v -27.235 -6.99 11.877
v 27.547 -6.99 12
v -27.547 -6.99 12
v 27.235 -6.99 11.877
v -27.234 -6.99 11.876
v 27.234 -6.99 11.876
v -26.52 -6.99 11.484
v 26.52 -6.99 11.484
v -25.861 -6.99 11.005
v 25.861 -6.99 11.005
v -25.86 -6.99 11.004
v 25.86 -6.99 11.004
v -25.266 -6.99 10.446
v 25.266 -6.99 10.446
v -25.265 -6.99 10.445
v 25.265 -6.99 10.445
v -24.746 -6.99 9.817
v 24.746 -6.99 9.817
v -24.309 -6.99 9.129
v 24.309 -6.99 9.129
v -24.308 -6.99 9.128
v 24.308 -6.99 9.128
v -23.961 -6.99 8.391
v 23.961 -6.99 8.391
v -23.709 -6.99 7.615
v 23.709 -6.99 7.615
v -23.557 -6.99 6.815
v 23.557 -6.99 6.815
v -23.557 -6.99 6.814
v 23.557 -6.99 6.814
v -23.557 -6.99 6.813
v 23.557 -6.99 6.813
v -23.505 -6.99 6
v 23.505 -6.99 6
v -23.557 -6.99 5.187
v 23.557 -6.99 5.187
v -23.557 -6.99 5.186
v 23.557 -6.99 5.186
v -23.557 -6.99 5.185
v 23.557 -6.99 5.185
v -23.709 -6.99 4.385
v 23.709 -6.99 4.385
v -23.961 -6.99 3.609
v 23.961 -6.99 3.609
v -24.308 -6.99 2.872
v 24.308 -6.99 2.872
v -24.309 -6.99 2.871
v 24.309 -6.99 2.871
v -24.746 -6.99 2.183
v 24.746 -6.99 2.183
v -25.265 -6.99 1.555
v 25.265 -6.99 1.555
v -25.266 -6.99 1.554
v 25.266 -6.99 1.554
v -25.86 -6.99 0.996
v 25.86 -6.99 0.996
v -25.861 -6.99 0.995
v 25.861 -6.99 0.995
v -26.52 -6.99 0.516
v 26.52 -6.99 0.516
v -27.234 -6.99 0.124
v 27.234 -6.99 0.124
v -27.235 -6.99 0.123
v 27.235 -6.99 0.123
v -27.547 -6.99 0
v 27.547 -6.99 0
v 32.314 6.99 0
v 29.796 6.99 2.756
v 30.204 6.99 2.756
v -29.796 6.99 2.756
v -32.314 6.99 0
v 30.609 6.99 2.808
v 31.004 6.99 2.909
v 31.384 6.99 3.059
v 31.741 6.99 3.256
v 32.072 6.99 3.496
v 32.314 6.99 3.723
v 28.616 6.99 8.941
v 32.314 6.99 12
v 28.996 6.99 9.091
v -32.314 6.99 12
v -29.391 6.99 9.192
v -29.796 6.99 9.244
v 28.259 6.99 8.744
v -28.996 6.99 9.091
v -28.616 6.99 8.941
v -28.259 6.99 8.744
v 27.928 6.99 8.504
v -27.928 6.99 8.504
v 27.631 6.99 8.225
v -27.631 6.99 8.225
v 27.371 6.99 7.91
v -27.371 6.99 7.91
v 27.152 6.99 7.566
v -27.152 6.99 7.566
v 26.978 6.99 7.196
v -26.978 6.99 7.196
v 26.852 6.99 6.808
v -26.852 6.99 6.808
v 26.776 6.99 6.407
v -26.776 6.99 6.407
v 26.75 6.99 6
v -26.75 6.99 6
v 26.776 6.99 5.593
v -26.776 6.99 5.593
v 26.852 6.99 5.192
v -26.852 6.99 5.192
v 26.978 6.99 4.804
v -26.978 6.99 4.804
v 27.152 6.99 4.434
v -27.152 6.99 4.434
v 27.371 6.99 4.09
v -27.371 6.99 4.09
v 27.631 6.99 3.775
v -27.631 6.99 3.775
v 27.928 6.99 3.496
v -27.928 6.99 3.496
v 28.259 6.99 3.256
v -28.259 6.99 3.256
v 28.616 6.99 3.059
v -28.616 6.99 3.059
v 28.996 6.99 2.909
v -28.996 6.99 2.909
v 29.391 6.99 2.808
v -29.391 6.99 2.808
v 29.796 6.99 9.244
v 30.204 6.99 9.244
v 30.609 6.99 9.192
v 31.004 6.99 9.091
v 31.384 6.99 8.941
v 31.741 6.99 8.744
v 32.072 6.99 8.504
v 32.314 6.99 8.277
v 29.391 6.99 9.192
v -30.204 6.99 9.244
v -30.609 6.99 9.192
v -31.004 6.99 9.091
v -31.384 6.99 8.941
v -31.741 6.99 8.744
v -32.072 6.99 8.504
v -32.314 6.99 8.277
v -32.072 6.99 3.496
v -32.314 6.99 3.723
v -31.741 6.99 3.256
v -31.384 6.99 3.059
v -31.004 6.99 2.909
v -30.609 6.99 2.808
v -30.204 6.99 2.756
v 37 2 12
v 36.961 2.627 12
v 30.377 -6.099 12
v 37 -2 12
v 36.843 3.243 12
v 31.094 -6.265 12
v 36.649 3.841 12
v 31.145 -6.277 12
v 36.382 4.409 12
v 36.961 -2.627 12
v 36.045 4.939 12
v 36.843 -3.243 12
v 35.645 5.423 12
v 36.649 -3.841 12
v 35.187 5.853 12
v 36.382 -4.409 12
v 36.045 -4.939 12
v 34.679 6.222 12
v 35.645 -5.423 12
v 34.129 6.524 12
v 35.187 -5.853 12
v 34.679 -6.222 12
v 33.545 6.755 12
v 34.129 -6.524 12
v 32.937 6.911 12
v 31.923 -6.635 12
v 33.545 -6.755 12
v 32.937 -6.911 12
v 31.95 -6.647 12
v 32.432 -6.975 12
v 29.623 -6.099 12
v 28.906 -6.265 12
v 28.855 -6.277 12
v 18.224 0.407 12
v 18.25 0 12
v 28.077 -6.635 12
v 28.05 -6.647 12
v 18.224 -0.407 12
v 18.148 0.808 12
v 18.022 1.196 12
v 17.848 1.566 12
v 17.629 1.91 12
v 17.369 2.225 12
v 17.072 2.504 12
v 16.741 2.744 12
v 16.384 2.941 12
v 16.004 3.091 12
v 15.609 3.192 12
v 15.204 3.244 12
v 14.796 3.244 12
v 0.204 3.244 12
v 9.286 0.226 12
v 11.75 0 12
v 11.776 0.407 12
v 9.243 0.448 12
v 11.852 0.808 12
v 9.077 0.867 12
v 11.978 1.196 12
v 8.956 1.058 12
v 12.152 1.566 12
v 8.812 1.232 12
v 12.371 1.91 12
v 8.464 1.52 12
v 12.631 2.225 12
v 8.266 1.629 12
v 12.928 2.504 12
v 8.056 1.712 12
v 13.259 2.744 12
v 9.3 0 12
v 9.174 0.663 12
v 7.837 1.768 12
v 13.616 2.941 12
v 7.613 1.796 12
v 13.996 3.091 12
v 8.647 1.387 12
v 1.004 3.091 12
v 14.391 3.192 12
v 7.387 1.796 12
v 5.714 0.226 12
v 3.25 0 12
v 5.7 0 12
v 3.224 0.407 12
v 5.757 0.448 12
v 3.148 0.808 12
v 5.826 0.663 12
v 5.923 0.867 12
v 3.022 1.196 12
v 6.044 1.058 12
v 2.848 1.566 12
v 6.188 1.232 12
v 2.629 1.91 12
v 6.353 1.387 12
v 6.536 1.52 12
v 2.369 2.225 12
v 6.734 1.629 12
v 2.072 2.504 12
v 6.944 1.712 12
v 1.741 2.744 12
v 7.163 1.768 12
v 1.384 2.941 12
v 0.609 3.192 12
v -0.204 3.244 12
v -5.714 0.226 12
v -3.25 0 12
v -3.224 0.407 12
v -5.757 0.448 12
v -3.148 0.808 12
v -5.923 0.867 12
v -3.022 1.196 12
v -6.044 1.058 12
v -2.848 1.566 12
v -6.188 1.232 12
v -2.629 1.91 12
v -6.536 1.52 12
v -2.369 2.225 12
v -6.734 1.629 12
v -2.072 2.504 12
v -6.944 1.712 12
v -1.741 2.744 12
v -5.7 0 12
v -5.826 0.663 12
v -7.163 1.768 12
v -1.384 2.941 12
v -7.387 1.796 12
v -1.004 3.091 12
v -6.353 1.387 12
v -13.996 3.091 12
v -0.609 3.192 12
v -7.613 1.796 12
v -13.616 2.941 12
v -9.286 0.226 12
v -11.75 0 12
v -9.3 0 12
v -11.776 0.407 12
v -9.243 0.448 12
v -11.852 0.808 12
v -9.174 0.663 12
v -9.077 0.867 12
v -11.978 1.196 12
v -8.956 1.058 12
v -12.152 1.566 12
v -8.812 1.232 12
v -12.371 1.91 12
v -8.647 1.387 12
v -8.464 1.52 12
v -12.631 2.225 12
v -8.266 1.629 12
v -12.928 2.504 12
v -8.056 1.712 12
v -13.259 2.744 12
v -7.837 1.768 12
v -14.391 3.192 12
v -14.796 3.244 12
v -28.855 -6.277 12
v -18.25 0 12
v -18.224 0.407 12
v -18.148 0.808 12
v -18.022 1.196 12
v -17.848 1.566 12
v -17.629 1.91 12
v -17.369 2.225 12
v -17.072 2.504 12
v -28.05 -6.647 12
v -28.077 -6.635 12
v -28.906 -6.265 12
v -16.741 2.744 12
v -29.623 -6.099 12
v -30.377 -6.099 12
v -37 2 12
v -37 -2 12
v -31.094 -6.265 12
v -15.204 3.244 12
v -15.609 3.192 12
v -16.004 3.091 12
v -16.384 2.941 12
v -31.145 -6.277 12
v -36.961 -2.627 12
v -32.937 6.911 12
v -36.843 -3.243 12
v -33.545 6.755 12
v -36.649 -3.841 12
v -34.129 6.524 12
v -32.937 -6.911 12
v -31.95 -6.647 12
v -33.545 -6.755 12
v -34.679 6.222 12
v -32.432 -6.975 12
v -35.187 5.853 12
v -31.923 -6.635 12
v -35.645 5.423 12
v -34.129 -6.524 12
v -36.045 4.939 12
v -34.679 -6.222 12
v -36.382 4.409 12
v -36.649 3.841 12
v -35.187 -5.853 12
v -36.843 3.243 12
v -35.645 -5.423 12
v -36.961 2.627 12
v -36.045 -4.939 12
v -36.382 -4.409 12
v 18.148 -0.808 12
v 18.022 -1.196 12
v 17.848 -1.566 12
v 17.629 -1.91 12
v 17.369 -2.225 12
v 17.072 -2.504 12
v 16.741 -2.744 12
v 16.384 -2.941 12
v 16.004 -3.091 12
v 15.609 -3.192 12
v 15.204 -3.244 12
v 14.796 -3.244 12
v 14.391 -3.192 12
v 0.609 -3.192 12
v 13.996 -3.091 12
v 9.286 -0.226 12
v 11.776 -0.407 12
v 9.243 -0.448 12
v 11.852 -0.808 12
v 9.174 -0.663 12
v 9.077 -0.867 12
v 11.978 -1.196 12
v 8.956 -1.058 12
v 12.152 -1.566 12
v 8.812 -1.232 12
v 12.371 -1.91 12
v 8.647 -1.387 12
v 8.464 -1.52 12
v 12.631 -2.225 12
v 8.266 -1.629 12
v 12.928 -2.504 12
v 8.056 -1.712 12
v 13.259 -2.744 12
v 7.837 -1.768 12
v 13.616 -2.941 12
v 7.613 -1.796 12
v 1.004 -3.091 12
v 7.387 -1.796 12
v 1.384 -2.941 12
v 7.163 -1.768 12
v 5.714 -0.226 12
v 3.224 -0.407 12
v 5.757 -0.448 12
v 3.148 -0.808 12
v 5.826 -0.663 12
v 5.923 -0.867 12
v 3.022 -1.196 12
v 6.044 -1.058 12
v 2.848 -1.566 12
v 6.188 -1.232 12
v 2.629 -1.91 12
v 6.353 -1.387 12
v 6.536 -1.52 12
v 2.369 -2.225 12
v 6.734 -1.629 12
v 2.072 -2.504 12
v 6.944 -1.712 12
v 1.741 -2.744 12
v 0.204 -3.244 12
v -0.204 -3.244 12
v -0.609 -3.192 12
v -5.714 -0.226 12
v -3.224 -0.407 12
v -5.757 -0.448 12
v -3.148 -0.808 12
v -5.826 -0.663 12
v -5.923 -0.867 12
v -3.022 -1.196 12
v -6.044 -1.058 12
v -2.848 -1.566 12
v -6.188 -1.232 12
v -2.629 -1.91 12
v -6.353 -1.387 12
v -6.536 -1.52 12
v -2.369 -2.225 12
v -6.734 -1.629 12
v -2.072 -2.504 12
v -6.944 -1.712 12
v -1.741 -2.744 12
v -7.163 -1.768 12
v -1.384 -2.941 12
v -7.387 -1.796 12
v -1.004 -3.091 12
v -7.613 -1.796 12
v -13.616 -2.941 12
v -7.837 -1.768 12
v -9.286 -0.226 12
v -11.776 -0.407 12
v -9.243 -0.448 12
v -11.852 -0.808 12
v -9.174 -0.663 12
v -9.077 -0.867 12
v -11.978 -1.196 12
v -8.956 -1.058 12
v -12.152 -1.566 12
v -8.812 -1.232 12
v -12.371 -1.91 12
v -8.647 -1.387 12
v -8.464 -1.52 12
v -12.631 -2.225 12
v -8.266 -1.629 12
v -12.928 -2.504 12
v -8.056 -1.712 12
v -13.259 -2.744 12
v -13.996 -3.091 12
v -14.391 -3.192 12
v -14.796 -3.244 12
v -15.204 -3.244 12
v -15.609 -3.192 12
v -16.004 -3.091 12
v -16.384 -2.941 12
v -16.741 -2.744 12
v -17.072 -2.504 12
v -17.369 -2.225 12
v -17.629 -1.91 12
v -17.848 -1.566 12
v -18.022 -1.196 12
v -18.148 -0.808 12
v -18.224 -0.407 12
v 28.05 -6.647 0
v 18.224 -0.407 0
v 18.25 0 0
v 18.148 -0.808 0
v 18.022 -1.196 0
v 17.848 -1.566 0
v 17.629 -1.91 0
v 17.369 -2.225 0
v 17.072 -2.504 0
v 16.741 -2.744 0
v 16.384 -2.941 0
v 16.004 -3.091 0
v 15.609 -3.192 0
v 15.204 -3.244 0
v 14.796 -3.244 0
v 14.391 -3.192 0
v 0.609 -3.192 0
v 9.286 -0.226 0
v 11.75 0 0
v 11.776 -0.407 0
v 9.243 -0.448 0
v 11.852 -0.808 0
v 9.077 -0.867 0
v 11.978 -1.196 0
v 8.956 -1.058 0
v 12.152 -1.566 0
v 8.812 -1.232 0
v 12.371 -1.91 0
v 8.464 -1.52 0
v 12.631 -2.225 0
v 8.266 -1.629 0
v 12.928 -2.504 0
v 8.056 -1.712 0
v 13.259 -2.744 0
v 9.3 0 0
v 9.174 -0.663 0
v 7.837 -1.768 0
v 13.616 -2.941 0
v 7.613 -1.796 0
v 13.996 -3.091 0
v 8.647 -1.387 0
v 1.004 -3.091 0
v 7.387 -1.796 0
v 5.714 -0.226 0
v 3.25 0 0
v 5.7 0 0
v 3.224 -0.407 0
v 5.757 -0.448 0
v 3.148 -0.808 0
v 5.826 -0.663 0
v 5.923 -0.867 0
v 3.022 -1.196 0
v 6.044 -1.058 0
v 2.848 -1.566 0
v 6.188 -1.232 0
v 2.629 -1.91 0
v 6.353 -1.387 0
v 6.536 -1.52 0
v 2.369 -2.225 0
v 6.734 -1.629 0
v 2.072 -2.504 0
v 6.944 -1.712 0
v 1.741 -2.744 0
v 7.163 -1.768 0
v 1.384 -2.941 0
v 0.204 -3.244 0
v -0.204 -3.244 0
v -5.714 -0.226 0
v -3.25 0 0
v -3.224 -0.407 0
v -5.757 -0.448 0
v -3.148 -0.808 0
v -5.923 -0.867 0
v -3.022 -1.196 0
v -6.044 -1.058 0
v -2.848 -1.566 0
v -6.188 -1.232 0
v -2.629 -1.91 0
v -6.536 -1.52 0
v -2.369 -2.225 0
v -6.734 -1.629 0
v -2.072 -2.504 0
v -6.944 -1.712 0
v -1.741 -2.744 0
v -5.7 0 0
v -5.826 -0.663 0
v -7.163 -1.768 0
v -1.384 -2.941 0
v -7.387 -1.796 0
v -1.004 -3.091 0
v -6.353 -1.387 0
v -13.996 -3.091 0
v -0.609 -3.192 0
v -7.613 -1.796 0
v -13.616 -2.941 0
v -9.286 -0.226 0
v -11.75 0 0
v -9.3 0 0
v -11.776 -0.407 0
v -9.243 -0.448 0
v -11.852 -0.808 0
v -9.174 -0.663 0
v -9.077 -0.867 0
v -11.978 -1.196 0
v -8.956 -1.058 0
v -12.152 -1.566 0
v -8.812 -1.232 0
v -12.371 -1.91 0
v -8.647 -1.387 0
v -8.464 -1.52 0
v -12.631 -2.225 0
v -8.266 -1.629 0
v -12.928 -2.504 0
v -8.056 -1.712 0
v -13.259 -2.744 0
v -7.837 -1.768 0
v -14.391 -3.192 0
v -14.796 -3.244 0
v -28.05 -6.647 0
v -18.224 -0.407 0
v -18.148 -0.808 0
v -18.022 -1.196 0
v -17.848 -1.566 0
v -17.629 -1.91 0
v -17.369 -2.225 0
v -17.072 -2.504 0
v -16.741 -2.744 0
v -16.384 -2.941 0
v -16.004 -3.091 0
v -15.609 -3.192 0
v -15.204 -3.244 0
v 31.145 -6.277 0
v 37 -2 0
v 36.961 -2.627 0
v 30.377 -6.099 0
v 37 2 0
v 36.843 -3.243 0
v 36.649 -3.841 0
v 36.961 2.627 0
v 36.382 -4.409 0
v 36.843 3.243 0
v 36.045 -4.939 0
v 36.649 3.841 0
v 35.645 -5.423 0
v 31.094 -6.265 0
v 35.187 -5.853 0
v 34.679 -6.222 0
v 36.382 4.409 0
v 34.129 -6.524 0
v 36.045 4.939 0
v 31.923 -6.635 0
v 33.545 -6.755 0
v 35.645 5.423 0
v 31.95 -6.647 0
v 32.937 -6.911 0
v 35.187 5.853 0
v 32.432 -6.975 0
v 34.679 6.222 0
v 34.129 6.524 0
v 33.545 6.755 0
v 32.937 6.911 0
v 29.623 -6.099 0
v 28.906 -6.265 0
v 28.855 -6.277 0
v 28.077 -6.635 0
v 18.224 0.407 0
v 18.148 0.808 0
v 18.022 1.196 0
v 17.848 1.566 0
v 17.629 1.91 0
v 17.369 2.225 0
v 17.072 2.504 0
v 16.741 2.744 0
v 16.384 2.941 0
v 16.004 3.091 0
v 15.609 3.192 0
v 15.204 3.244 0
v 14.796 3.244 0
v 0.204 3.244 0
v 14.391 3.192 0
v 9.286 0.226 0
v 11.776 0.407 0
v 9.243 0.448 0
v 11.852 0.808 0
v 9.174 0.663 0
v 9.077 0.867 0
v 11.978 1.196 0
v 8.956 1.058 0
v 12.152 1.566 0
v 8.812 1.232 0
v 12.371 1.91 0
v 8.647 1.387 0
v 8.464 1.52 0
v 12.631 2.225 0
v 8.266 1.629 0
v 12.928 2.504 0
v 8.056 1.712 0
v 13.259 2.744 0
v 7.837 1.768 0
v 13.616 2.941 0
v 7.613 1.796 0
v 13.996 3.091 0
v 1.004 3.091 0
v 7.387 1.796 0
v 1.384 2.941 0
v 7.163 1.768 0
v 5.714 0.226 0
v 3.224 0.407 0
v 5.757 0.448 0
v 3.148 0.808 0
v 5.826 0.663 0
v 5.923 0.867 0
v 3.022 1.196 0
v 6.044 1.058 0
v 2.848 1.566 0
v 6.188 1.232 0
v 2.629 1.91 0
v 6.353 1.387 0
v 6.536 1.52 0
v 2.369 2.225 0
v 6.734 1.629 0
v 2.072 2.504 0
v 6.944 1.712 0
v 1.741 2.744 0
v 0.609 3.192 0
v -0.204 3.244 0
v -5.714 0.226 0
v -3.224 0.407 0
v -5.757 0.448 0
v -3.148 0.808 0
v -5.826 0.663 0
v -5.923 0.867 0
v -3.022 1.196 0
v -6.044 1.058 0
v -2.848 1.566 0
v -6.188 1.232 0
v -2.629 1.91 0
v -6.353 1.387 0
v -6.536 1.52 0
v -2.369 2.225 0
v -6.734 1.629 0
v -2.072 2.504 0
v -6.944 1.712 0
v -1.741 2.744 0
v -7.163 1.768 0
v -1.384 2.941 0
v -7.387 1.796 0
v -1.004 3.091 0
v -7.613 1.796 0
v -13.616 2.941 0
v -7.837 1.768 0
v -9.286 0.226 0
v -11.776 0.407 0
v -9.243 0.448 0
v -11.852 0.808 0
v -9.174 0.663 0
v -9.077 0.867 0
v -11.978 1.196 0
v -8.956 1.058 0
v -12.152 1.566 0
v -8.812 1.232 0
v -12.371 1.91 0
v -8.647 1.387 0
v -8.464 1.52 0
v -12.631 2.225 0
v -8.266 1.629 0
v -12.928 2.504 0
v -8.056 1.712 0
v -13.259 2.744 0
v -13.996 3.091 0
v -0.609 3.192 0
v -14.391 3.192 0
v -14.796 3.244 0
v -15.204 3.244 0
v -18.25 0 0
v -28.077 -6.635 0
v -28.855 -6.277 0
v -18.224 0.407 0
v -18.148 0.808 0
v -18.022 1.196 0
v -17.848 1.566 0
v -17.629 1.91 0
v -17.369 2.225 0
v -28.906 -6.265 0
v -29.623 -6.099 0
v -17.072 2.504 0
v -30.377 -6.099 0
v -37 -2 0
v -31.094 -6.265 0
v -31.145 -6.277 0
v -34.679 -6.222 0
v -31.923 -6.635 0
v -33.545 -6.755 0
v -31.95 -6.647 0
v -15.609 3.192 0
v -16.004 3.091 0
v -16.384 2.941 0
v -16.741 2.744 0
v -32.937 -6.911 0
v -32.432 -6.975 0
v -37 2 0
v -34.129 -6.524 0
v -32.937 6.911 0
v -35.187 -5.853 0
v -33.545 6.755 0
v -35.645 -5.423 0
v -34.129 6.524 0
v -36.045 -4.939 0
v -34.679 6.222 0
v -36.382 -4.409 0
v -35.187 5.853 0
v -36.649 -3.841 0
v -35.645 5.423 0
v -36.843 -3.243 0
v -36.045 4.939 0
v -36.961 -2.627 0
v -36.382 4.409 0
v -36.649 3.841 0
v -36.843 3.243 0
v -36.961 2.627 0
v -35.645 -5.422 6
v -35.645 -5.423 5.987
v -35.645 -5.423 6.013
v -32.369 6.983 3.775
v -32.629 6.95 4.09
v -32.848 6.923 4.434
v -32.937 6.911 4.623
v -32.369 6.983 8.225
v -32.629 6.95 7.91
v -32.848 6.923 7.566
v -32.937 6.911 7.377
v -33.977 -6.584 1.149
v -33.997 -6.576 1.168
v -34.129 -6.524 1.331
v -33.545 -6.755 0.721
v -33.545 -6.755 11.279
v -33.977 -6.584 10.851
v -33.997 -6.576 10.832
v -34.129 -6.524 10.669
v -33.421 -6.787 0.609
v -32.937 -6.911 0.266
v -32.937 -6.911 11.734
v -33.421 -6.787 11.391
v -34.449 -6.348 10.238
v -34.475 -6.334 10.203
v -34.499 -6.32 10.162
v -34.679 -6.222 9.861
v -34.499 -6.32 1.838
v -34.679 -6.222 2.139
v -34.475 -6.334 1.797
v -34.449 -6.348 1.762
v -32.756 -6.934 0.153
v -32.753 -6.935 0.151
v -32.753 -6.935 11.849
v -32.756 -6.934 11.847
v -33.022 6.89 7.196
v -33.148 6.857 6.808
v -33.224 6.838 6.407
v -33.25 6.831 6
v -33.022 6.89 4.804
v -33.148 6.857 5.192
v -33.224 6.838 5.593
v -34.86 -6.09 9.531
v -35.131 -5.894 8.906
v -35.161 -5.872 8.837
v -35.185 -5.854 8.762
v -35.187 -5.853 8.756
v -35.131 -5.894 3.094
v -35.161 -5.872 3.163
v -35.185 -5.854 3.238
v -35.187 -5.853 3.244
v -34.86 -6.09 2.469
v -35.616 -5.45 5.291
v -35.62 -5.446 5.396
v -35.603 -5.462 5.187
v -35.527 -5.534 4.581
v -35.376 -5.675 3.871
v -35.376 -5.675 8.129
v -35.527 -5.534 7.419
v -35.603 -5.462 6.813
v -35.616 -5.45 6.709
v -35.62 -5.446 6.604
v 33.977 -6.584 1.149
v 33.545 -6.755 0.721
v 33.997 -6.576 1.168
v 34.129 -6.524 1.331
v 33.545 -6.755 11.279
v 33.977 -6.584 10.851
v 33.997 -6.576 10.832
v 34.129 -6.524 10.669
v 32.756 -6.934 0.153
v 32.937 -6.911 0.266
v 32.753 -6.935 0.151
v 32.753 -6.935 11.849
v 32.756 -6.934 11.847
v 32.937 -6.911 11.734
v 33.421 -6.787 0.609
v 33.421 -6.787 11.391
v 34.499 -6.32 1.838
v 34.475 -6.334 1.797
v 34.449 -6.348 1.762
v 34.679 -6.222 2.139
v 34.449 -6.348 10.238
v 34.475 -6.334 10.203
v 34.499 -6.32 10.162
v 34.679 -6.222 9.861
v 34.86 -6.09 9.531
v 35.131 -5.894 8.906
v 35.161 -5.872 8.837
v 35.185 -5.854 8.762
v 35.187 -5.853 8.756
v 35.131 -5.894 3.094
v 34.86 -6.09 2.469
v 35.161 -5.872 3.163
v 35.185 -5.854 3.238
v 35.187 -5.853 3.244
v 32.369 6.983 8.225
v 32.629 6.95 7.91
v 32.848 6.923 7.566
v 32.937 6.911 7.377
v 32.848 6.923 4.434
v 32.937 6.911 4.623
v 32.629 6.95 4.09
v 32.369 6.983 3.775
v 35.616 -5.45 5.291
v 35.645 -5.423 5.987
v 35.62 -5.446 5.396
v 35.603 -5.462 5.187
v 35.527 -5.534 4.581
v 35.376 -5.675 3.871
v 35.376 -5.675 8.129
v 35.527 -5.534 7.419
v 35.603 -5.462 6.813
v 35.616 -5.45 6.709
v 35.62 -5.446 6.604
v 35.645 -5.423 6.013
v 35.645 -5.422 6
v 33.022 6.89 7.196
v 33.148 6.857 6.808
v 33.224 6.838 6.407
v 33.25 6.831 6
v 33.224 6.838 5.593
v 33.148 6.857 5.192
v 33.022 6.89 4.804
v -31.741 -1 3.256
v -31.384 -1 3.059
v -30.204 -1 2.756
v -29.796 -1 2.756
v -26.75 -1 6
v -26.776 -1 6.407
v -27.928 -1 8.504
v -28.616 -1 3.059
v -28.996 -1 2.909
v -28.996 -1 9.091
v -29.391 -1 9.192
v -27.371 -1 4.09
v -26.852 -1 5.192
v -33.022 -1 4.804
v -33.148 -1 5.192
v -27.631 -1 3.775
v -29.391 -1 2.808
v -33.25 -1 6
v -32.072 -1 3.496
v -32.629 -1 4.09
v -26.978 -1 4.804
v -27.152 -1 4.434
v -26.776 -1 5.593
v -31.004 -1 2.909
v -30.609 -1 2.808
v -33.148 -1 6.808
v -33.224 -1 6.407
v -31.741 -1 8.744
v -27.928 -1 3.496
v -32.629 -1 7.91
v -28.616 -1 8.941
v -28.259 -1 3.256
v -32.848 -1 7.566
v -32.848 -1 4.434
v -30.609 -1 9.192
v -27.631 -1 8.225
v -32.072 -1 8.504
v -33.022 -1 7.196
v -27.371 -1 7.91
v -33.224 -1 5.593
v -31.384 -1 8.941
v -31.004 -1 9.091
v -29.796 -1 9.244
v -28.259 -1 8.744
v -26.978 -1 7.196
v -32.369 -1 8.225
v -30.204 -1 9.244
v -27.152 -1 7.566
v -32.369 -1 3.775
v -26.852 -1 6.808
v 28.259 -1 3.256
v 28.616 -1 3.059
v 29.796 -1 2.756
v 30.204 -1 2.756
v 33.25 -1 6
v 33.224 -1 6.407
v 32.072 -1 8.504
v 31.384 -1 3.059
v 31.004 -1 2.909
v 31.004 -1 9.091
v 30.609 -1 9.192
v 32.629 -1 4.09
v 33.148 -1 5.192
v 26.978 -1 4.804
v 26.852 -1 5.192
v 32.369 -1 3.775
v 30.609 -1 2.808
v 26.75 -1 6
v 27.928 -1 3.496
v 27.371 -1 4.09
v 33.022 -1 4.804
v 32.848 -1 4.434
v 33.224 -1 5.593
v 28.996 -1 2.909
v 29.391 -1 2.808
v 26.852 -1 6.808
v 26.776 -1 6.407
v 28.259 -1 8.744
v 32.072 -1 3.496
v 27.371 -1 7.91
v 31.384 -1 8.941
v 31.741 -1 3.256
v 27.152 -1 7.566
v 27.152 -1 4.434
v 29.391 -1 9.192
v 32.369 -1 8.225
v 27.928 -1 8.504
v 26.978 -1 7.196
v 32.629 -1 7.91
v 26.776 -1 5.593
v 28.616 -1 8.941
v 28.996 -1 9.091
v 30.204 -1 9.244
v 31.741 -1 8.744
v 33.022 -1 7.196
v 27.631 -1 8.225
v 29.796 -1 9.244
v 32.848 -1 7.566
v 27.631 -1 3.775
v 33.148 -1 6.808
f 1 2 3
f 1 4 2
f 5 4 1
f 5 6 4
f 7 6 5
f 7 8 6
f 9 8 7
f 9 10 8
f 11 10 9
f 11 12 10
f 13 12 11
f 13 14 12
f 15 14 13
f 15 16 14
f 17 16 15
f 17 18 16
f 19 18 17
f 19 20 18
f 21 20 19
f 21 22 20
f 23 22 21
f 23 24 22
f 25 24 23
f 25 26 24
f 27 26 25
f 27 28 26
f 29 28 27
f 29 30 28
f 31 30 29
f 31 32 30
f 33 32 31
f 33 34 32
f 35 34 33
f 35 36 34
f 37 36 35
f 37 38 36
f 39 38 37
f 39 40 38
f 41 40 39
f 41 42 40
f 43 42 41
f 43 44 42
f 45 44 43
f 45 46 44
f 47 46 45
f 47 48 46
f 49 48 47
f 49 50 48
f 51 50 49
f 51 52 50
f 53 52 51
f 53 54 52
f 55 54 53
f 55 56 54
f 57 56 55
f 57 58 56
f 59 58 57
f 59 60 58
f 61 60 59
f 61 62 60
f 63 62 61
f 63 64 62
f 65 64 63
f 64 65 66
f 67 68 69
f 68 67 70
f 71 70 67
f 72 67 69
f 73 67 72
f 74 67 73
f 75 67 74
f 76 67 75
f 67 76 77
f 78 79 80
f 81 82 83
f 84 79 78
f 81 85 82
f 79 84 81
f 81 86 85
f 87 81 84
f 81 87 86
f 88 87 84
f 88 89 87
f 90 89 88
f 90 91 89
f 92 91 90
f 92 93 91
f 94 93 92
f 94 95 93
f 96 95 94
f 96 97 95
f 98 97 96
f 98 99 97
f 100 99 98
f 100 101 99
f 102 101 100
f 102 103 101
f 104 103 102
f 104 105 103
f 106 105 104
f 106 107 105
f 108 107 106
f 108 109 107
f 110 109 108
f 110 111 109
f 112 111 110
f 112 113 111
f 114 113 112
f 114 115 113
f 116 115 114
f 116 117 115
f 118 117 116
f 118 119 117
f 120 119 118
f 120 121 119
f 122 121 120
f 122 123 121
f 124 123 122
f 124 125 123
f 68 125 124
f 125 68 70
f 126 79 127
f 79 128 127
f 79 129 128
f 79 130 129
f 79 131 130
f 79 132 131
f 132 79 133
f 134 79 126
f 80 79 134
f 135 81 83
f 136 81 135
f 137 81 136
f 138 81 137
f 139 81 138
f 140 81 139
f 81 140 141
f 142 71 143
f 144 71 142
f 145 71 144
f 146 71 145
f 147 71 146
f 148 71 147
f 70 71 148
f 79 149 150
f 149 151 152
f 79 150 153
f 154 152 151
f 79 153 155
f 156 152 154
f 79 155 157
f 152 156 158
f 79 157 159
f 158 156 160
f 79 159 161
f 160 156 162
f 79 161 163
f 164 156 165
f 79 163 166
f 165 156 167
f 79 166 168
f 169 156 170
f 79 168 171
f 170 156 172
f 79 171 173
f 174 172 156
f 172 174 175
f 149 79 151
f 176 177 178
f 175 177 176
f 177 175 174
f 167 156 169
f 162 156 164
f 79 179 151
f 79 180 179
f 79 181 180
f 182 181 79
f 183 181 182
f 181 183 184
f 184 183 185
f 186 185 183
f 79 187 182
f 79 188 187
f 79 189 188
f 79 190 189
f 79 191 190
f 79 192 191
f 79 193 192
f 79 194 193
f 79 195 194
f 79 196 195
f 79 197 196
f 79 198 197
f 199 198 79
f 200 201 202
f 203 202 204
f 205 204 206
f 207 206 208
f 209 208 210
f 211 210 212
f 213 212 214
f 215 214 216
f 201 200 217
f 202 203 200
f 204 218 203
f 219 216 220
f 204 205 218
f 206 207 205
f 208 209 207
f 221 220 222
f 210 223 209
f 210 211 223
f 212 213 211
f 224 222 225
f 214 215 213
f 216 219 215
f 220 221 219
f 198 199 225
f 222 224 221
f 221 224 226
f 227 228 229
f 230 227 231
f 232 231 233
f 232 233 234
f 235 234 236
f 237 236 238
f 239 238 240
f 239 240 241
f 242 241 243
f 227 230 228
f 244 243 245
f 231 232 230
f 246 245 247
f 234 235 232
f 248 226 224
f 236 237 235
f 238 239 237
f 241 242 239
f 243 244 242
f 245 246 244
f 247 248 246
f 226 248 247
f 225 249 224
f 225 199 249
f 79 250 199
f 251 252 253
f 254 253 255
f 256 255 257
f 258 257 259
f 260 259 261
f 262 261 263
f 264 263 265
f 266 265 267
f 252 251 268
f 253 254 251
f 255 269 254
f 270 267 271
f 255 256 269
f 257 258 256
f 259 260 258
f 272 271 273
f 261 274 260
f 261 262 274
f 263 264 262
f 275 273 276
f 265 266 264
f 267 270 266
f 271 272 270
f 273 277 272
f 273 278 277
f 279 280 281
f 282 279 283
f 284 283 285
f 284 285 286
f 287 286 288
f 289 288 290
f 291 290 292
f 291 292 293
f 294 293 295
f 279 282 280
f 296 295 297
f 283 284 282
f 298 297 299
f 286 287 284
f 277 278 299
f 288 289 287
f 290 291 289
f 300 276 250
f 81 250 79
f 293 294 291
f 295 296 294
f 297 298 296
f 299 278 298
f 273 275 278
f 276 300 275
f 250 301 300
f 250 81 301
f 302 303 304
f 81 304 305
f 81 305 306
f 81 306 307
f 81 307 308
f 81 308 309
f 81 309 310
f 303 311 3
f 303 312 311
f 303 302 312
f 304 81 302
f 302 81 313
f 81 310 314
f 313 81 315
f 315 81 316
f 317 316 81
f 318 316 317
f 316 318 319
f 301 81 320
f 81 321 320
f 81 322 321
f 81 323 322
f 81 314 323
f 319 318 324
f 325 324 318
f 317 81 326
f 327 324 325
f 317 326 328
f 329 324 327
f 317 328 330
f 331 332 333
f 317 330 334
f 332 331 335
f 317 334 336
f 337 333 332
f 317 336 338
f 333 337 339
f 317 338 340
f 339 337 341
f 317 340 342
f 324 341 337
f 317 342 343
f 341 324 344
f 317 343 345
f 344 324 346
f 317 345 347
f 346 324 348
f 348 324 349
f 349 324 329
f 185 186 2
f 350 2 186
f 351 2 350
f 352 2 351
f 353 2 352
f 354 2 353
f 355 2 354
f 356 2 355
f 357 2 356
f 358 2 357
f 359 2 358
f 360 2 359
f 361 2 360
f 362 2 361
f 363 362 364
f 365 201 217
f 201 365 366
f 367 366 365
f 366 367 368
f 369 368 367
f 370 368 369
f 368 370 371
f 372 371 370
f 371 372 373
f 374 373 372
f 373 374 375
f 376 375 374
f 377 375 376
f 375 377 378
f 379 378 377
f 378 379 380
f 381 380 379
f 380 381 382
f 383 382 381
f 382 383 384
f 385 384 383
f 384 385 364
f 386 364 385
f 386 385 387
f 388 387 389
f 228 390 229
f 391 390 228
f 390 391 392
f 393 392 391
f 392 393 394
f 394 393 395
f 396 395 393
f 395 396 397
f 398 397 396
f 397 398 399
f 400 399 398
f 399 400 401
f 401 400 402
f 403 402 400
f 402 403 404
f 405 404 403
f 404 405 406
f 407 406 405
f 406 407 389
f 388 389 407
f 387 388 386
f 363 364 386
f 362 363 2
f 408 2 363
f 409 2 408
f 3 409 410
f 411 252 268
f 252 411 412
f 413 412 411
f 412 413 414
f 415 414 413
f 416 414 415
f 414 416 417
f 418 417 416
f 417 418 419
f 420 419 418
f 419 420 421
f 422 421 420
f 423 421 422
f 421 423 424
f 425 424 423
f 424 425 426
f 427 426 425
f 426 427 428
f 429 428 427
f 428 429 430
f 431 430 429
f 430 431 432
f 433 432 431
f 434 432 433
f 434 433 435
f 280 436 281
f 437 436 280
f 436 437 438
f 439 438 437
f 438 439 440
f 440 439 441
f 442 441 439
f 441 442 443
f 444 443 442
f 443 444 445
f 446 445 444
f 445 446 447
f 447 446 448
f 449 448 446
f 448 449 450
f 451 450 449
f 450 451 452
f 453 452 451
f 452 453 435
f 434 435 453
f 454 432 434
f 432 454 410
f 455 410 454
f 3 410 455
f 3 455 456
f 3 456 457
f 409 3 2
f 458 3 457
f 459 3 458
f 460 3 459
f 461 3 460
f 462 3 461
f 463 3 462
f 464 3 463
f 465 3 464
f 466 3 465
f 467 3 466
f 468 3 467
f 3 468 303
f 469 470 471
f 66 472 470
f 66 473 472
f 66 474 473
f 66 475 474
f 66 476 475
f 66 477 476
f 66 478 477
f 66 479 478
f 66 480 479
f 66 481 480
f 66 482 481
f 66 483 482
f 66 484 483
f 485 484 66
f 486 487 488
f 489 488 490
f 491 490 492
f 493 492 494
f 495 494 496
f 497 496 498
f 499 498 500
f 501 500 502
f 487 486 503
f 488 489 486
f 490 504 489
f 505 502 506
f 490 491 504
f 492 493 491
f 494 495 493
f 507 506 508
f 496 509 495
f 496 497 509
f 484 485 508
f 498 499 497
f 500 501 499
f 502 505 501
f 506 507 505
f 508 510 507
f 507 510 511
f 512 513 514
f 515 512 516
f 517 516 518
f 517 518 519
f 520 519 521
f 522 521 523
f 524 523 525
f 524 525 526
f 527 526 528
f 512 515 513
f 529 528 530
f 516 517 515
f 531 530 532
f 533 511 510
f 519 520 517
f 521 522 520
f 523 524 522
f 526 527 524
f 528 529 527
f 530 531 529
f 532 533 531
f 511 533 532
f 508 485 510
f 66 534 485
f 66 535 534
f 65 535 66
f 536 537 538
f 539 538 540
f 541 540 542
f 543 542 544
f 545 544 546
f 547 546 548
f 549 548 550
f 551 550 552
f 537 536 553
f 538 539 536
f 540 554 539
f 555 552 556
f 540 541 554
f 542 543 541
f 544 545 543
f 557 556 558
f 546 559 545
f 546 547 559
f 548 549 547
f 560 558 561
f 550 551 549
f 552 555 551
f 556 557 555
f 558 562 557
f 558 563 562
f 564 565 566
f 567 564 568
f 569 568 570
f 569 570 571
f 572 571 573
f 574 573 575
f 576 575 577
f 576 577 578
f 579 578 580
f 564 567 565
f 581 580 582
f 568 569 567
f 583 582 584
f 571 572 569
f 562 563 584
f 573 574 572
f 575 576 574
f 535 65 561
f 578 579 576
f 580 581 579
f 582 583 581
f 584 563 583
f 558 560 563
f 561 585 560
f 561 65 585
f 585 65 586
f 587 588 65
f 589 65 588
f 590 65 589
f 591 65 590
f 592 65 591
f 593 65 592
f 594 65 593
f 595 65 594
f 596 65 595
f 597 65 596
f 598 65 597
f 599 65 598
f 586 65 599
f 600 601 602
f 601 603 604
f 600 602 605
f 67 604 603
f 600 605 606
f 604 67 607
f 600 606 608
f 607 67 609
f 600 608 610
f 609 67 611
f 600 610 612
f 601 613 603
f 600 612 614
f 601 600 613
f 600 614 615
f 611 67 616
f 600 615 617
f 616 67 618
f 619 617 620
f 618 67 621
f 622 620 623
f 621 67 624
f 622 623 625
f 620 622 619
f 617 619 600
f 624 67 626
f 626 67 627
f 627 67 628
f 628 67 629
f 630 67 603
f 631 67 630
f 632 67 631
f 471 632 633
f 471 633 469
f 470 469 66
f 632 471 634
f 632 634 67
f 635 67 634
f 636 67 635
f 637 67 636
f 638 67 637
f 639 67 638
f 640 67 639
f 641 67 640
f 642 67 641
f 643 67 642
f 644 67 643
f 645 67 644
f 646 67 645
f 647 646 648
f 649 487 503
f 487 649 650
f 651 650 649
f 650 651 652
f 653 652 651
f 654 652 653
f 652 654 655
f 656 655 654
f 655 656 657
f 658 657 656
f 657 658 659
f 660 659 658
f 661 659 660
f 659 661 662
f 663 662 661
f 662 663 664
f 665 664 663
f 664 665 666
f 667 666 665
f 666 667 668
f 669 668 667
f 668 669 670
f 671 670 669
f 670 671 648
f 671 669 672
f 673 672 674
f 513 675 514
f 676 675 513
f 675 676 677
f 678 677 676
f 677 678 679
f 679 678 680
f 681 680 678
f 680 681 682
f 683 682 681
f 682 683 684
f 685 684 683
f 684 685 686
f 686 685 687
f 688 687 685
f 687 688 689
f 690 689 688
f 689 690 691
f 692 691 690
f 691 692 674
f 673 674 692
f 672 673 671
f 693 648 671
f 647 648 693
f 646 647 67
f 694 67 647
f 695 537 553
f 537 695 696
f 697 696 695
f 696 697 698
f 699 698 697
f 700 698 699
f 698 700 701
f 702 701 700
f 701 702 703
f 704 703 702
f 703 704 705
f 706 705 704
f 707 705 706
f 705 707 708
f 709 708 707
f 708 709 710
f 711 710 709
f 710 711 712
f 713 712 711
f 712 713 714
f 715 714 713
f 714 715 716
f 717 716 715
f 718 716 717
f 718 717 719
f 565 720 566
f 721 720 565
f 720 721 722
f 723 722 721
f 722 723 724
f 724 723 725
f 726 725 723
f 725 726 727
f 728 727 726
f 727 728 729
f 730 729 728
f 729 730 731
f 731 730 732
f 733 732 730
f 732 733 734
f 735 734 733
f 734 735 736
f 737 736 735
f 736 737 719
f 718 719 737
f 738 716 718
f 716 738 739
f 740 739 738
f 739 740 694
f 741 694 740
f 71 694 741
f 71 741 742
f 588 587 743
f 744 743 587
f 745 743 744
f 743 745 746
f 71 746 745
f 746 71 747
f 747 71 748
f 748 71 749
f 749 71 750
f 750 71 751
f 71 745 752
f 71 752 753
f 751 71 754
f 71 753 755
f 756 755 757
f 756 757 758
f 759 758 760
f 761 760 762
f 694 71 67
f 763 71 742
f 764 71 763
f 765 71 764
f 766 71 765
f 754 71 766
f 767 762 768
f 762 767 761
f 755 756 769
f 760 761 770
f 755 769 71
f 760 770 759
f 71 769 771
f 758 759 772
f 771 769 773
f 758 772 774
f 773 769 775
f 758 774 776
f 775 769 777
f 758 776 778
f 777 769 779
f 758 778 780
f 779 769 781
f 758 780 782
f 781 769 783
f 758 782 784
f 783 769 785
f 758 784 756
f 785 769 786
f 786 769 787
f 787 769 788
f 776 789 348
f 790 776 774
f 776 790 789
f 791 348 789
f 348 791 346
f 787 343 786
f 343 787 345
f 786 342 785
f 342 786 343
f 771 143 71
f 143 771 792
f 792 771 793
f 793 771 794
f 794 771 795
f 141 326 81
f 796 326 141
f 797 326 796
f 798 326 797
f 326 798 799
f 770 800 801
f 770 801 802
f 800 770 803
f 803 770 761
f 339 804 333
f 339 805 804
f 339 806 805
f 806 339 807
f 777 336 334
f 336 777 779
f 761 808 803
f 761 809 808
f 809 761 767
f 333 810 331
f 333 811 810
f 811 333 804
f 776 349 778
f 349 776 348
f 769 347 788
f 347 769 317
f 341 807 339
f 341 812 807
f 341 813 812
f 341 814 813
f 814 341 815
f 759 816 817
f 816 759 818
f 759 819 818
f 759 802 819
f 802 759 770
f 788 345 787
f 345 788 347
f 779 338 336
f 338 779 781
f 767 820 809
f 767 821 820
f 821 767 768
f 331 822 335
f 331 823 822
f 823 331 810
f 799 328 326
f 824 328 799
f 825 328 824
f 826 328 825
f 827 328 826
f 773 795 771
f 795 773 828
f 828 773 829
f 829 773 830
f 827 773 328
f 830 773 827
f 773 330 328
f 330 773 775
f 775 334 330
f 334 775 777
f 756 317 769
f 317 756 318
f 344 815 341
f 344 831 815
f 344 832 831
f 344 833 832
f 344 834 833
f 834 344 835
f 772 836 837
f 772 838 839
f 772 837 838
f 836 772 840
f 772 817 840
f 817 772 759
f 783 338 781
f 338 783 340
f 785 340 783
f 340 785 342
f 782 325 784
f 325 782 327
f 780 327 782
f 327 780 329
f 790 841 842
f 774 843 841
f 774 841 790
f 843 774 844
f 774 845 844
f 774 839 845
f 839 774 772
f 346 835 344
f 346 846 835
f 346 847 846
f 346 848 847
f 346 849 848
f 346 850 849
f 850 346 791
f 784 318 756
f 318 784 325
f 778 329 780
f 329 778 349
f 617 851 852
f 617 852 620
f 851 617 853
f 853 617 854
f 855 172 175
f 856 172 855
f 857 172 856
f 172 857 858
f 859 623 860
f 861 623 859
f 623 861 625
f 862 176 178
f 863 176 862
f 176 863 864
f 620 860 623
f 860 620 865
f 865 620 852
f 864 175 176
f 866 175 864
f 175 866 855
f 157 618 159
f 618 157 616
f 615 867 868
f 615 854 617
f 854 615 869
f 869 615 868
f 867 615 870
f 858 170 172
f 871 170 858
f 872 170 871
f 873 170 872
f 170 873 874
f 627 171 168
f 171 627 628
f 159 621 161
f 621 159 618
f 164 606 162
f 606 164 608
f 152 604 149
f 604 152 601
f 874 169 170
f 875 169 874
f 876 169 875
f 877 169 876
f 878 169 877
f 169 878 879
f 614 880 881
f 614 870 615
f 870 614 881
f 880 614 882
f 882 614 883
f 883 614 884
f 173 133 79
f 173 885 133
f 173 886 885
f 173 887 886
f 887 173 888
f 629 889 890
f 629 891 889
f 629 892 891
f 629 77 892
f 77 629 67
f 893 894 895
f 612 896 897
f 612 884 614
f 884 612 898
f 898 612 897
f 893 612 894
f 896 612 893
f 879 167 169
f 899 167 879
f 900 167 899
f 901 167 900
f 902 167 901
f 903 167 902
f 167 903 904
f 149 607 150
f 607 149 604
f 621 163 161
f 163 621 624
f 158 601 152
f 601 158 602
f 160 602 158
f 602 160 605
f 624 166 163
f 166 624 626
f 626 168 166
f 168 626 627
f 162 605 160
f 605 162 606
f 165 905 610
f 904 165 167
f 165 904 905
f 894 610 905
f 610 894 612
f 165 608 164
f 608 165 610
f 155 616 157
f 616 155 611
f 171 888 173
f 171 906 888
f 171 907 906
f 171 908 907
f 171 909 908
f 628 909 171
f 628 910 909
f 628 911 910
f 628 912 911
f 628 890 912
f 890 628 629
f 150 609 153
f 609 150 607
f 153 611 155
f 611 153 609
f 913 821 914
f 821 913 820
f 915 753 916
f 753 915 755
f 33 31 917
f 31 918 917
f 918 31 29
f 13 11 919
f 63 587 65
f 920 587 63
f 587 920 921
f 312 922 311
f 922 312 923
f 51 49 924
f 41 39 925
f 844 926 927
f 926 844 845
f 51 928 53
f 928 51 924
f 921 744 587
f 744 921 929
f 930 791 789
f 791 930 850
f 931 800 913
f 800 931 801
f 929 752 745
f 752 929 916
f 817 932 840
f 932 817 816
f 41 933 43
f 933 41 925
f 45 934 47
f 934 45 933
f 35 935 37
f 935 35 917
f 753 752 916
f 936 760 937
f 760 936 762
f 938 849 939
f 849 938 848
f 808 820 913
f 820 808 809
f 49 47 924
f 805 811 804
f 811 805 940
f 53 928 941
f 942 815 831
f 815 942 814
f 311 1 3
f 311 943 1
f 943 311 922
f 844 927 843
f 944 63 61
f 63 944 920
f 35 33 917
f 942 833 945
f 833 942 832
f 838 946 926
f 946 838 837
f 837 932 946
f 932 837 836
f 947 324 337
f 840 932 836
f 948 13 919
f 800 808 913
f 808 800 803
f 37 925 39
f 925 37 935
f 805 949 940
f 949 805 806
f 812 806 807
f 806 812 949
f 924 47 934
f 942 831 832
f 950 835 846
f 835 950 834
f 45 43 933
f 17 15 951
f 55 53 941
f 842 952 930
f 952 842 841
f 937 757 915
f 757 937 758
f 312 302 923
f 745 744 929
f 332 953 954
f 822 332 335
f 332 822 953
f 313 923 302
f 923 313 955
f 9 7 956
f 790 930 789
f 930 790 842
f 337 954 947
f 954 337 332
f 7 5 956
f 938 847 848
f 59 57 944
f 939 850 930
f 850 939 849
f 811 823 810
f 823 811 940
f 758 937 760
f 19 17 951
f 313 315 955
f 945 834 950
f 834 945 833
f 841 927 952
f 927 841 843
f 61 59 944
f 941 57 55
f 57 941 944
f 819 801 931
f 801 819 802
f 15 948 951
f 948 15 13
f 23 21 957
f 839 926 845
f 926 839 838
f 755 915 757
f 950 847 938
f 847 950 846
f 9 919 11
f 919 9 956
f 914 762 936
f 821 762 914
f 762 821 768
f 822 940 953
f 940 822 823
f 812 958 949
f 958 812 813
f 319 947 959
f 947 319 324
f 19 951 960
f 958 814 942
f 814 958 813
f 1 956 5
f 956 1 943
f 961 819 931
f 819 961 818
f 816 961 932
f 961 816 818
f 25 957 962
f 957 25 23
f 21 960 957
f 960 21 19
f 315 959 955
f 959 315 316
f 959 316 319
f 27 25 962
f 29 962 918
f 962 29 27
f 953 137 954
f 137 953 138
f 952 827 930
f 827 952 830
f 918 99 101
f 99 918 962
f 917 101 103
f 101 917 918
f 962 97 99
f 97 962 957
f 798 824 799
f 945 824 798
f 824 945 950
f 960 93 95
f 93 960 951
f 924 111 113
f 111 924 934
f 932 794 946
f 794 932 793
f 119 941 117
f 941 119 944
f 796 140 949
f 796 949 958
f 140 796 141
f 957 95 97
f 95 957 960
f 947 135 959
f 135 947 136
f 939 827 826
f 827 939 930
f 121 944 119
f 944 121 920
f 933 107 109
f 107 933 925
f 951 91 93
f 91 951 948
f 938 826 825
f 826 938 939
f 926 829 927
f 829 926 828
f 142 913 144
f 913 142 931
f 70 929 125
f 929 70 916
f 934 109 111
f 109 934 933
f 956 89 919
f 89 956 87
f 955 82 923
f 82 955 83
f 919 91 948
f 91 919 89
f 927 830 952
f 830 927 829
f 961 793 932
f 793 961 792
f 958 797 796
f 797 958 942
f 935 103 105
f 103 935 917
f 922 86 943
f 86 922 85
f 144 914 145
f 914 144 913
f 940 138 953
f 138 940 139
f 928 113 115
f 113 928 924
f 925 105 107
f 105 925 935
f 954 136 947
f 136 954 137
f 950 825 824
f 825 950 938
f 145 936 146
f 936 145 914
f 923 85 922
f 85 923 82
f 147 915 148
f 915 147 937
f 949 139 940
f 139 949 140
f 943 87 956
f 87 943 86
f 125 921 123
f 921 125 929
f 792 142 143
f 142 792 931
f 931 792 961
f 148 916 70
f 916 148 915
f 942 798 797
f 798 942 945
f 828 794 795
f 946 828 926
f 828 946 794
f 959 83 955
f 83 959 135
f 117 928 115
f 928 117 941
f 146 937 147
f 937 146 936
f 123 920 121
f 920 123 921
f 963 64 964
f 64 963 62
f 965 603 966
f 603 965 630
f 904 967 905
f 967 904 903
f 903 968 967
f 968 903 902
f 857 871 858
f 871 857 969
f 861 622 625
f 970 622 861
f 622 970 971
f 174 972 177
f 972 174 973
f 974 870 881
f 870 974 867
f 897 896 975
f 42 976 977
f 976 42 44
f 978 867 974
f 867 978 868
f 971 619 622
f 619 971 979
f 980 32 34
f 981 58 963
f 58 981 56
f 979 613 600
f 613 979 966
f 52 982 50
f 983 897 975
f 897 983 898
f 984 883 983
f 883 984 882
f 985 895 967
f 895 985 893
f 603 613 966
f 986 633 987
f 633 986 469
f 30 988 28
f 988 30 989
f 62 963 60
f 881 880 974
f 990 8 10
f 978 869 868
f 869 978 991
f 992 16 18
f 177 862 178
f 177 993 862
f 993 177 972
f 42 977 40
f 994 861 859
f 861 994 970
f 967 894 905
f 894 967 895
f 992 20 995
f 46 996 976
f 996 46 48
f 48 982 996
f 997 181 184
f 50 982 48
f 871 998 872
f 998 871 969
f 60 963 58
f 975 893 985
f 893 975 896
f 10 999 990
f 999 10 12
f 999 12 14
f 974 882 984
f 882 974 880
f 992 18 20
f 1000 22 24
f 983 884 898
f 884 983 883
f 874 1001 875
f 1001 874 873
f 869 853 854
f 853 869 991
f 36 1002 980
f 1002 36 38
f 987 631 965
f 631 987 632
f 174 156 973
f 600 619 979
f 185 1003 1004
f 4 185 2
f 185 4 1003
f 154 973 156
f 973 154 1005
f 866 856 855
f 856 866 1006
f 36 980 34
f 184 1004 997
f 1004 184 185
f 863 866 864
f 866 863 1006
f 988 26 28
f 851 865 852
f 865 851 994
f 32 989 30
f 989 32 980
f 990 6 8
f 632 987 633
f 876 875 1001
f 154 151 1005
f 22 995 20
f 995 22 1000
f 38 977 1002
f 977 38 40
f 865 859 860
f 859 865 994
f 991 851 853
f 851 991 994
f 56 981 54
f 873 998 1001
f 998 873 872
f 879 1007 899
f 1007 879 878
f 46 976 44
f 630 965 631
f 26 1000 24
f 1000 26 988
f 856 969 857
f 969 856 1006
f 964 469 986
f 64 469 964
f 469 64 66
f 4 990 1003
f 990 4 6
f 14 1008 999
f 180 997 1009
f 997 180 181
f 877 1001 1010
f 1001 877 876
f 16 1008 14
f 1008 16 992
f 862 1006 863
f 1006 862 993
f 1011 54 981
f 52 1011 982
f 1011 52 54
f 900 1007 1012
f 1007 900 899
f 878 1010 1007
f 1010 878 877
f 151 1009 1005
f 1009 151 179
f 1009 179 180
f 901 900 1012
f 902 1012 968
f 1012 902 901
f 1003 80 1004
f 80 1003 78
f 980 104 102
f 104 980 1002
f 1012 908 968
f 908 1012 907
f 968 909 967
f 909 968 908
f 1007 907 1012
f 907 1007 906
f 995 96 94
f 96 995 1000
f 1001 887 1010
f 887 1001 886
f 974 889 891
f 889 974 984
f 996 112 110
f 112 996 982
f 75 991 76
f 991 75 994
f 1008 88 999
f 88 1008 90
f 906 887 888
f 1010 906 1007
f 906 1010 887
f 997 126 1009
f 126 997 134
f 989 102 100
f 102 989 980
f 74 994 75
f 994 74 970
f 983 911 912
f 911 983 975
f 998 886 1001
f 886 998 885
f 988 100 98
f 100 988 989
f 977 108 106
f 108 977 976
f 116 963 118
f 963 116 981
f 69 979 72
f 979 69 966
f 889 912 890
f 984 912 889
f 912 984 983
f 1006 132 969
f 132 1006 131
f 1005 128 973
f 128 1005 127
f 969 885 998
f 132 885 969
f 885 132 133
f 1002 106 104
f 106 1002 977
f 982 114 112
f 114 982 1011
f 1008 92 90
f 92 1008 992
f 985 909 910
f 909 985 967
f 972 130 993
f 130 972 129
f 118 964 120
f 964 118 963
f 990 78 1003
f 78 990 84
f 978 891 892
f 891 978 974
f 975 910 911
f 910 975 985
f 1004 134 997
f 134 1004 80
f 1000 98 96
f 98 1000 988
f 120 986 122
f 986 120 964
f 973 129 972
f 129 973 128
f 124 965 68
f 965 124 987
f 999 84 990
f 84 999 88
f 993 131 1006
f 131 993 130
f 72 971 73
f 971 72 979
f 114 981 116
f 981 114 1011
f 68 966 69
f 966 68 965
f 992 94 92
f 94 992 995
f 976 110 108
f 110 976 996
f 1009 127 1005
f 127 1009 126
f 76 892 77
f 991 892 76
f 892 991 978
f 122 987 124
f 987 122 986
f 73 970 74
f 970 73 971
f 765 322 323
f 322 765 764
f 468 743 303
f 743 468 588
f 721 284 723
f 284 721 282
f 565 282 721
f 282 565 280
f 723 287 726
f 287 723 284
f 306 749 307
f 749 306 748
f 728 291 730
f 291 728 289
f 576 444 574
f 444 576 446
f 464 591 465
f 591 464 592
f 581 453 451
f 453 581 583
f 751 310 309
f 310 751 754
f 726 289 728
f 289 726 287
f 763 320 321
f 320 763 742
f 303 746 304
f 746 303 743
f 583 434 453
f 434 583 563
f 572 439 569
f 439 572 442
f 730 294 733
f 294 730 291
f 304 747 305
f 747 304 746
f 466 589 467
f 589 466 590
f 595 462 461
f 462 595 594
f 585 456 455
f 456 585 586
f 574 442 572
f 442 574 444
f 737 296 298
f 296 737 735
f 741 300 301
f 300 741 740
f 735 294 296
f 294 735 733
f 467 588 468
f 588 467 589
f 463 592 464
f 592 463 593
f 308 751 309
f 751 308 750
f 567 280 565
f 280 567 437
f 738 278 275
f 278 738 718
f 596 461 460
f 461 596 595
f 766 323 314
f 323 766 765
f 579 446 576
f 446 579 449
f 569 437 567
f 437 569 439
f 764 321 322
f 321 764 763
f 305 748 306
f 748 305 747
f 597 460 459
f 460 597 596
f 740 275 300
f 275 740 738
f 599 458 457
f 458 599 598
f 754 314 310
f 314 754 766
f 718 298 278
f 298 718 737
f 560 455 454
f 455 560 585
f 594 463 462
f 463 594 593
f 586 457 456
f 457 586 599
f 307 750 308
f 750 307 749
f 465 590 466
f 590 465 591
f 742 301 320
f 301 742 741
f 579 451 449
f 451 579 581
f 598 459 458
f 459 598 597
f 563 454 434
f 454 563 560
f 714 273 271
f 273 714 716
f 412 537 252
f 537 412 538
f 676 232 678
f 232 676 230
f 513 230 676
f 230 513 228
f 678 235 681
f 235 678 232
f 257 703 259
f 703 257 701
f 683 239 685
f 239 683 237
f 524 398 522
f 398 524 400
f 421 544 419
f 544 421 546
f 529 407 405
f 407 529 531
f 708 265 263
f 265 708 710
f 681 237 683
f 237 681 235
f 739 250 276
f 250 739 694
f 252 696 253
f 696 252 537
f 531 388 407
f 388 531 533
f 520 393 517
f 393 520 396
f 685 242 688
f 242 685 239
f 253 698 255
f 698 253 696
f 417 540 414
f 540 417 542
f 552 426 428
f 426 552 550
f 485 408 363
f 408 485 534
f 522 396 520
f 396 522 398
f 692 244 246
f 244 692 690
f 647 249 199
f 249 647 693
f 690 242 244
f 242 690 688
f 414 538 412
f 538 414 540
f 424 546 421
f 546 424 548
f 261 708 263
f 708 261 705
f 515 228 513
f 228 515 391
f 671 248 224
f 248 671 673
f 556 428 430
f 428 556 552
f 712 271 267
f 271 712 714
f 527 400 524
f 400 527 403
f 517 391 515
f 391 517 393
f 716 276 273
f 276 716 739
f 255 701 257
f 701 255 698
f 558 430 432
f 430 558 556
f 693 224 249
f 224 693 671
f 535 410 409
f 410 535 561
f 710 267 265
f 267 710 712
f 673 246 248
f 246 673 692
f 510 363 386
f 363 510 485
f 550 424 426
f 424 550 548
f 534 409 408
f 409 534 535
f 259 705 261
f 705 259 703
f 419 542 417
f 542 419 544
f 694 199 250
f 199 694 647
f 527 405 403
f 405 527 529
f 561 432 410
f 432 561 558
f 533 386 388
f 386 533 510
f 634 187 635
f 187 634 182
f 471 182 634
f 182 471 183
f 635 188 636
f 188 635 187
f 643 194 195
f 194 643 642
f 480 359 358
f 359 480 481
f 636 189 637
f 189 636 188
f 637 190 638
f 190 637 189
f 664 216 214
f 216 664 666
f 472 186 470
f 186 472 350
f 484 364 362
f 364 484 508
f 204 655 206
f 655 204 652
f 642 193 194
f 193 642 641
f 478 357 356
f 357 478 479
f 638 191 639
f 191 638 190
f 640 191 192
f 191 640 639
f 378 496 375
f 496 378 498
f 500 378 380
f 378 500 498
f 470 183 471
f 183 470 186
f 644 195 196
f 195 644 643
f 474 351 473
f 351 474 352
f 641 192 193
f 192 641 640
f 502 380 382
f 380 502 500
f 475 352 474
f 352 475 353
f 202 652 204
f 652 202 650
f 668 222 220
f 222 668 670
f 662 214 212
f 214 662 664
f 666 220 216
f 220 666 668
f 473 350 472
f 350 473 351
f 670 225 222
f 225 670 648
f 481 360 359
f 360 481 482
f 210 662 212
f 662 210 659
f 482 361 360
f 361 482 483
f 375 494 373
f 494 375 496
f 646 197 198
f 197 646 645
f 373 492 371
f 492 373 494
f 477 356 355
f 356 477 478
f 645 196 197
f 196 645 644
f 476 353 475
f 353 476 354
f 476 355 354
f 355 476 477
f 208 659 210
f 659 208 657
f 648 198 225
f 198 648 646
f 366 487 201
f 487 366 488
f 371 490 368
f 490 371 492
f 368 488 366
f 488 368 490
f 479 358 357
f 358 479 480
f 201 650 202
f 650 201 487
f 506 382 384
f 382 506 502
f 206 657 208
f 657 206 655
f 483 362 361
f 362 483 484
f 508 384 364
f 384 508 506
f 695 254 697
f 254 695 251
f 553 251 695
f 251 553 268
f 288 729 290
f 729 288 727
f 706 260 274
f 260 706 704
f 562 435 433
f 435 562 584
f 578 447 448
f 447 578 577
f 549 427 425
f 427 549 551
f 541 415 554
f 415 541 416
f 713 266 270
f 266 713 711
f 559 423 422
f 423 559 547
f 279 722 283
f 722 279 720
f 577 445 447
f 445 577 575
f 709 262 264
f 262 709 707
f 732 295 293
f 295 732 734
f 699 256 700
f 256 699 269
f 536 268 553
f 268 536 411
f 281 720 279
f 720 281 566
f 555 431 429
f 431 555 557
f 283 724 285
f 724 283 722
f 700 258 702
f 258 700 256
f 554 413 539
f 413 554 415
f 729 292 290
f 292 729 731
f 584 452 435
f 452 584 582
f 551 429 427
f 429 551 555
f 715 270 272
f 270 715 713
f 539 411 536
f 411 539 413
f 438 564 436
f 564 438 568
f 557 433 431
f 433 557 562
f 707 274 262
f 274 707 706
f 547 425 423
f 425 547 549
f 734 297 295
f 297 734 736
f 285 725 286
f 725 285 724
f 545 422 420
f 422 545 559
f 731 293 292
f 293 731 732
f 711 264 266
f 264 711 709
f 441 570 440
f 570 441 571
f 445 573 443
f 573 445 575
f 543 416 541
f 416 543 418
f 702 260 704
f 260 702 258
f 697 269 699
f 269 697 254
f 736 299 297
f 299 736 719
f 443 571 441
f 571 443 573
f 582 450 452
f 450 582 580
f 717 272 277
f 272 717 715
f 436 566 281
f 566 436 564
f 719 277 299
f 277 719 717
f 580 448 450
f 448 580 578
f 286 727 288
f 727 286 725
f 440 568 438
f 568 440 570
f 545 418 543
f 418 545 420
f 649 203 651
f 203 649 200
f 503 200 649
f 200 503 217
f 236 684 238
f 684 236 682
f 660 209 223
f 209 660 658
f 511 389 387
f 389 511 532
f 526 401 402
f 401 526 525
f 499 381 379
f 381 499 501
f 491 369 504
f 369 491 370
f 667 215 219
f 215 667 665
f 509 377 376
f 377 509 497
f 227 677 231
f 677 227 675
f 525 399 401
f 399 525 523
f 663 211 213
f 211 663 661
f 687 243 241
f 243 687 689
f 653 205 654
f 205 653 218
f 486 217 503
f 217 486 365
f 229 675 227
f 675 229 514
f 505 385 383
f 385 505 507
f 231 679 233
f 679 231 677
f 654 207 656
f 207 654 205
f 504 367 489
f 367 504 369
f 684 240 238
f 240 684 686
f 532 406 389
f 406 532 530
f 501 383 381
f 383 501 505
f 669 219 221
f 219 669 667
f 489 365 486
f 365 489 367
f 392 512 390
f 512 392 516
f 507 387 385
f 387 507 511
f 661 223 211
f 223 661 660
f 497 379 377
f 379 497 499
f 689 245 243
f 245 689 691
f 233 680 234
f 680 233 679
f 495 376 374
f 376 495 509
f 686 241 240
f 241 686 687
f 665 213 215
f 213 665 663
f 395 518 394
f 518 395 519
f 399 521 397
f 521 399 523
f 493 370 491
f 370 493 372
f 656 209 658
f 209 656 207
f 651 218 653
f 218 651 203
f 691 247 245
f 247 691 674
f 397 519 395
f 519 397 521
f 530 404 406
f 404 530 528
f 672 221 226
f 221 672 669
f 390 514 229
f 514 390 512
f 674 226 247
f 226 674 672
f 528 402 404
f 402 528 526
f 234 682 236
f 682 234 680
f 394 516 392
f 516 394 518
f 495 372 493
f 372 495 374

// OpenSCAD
$fn = 50;


difference() {
	union() {
		hull() {
			translate(v = [-17.0000000000, 2.0000000000, 0]) {
				cylinder(h = 12, r = 5);
			}
			translate(v = [17.0000000000, 2.0000000000, 0]) {
				cylinder(h = 12, r = 5);
			}
			translate(v = [-17.0000000000, -2.0000000000, 0]) {
				cylinder(h = 12, r = 5);
			}
			translate(v = [17.0000000000, -2.0000000000, 0]) {
				cylinder(h = 12, r = 5);
			}
		}
		translate(v = [-22.5000000000, 0.0000000000, 0]) {
			hull() {
				translate(v = [-9.5000000000, 2.0000000000, 0]) {
					cylinder(h = 12, r = 5);
				}
				translate(v = [9.5000000000, 2.0000000000, 0]) {
					cylinder(h = 12, r = 5);
				}
				translate(v = [-9.5000000000, -2.0000000000, 0]) {
					cylinder(h = 12, r = 5);
				}
				translate(v = [9.5000000000, -2.0000000000, 0]) {
					cylinder(h = 12, r = 5);
				}
			}
		}
		translate(v = [22.5000000000, 0.0000000000, 0]) {
			hull() {
				translate(v = [-9.5000000000, 2.0000000000, 0]) {
					cylinder(h = 12, r = 5);
				}
				translate(v = [9.5000000000, 2.0000000000, 0]) {
					cylinder(h = 12, r = 5);
				}
				translate(v = [-9.5000000000, -2.0000000000, 0]) {
					cylinder(h = 12, r = 5);
				}
				translate(v = [9.5000000000, -2.0000000000, 0]) {
					cylinder(h = 12, r = 5);
				}
			}
		}
	}
	union() {
		translate(v = [-30.0000000000, -7.0000000000, 6.0000000000]) {
			rotate(a = [90, 0, 0]) {
				difference() {
					union() {
						#translate(v = [0, 0, -14.0000000000]) {
							cylinder(h = 14, r = 2.2500000000);
						}
						#translate(v = [0, 0, -6]) {
							cylinder(h = 6, r1 = 3.2500000000, r2 = 6.5000000000);
						}
						#translate(v = [0, 0, -14.0000000000]) {
							cylinder(h = 14, r = 3.2500000000);
						}
						#translate(v = [0, 0, -14.0000000000]) {
							cylinder(h = 14, r = 2.2500000000);
						}
					}
					union();
				}
			}
		}
		translate(v = [30.0000000000, -7.0000000000, 6.0000000000]) {
			rotate(a = [90, 0, 0]) {
				difference() {
					union() {
						#translate(v = [0, 0, -14.0000000000]) {
							cylinder(h = 14, r = 2.2500000000);
						}
						#translate(v = [0, 0, -6]) {
							cylinder(h = 6, r1 = 3.2500000000, r2 = 6.5000000000);
						}
						#translate(v = [0, 0, -14.0000000000]) {
							cylinder(h = 14, r = 3.2500000000);
						}
						#translate(v = [0, 0, -14.0000000000]) {
							cylinder(h = 14, r = 2.2500000000);
						}
					}
					union();
				}
			}
		}
		translate(v = [-15.0000000000, 0.0000000000, 0]) {
			translate(v = [0, 0, -100]) {
				cylinder(h = 200, r = 3.2500000000);
			}
		}
		translate(v = [0, 0, -100]) {
			cylinder(h = 200, r = 3.2500000000);
		}
		translate(v = [15.0000000000, 0.0000000000, 0]) {
			translate(v = [0, 0, -100]) {
				cylinder(h = 200, r = 3.2500000000);
			}
		}
		translate(v = [-15.0000000000, 0.0000000000, 0]) {
			translate(v = [0, 0, -100]) {
				cylinder(h = 200, r = 1.8000000000);
			}
		}
		translate(v = [-7.5000000000, 0.0000000000, 0]) {
			translate(v = [0, 0, -100]) {
				cylinder(h = 200, r = 1.8000000000);
			}
		}
		translate(v = [0, 0, -100]) {
			cylinder(h = 200, r = 1.8000000000);
		}
		translate(v = [7.5000000000, 0.0000000000, 0]) {
			translate(v = [0, 0, -100]) {
				cylinder(h = 200, r = 1.8000000000);
			}
		}
		translate(v = [15.0000000000, 0.0000000000, 0]) {
			translate(v = [0, 0, -100]) {
				cylinder(h = 200, r = 1.8000000000);
			}
		}
	}
}
